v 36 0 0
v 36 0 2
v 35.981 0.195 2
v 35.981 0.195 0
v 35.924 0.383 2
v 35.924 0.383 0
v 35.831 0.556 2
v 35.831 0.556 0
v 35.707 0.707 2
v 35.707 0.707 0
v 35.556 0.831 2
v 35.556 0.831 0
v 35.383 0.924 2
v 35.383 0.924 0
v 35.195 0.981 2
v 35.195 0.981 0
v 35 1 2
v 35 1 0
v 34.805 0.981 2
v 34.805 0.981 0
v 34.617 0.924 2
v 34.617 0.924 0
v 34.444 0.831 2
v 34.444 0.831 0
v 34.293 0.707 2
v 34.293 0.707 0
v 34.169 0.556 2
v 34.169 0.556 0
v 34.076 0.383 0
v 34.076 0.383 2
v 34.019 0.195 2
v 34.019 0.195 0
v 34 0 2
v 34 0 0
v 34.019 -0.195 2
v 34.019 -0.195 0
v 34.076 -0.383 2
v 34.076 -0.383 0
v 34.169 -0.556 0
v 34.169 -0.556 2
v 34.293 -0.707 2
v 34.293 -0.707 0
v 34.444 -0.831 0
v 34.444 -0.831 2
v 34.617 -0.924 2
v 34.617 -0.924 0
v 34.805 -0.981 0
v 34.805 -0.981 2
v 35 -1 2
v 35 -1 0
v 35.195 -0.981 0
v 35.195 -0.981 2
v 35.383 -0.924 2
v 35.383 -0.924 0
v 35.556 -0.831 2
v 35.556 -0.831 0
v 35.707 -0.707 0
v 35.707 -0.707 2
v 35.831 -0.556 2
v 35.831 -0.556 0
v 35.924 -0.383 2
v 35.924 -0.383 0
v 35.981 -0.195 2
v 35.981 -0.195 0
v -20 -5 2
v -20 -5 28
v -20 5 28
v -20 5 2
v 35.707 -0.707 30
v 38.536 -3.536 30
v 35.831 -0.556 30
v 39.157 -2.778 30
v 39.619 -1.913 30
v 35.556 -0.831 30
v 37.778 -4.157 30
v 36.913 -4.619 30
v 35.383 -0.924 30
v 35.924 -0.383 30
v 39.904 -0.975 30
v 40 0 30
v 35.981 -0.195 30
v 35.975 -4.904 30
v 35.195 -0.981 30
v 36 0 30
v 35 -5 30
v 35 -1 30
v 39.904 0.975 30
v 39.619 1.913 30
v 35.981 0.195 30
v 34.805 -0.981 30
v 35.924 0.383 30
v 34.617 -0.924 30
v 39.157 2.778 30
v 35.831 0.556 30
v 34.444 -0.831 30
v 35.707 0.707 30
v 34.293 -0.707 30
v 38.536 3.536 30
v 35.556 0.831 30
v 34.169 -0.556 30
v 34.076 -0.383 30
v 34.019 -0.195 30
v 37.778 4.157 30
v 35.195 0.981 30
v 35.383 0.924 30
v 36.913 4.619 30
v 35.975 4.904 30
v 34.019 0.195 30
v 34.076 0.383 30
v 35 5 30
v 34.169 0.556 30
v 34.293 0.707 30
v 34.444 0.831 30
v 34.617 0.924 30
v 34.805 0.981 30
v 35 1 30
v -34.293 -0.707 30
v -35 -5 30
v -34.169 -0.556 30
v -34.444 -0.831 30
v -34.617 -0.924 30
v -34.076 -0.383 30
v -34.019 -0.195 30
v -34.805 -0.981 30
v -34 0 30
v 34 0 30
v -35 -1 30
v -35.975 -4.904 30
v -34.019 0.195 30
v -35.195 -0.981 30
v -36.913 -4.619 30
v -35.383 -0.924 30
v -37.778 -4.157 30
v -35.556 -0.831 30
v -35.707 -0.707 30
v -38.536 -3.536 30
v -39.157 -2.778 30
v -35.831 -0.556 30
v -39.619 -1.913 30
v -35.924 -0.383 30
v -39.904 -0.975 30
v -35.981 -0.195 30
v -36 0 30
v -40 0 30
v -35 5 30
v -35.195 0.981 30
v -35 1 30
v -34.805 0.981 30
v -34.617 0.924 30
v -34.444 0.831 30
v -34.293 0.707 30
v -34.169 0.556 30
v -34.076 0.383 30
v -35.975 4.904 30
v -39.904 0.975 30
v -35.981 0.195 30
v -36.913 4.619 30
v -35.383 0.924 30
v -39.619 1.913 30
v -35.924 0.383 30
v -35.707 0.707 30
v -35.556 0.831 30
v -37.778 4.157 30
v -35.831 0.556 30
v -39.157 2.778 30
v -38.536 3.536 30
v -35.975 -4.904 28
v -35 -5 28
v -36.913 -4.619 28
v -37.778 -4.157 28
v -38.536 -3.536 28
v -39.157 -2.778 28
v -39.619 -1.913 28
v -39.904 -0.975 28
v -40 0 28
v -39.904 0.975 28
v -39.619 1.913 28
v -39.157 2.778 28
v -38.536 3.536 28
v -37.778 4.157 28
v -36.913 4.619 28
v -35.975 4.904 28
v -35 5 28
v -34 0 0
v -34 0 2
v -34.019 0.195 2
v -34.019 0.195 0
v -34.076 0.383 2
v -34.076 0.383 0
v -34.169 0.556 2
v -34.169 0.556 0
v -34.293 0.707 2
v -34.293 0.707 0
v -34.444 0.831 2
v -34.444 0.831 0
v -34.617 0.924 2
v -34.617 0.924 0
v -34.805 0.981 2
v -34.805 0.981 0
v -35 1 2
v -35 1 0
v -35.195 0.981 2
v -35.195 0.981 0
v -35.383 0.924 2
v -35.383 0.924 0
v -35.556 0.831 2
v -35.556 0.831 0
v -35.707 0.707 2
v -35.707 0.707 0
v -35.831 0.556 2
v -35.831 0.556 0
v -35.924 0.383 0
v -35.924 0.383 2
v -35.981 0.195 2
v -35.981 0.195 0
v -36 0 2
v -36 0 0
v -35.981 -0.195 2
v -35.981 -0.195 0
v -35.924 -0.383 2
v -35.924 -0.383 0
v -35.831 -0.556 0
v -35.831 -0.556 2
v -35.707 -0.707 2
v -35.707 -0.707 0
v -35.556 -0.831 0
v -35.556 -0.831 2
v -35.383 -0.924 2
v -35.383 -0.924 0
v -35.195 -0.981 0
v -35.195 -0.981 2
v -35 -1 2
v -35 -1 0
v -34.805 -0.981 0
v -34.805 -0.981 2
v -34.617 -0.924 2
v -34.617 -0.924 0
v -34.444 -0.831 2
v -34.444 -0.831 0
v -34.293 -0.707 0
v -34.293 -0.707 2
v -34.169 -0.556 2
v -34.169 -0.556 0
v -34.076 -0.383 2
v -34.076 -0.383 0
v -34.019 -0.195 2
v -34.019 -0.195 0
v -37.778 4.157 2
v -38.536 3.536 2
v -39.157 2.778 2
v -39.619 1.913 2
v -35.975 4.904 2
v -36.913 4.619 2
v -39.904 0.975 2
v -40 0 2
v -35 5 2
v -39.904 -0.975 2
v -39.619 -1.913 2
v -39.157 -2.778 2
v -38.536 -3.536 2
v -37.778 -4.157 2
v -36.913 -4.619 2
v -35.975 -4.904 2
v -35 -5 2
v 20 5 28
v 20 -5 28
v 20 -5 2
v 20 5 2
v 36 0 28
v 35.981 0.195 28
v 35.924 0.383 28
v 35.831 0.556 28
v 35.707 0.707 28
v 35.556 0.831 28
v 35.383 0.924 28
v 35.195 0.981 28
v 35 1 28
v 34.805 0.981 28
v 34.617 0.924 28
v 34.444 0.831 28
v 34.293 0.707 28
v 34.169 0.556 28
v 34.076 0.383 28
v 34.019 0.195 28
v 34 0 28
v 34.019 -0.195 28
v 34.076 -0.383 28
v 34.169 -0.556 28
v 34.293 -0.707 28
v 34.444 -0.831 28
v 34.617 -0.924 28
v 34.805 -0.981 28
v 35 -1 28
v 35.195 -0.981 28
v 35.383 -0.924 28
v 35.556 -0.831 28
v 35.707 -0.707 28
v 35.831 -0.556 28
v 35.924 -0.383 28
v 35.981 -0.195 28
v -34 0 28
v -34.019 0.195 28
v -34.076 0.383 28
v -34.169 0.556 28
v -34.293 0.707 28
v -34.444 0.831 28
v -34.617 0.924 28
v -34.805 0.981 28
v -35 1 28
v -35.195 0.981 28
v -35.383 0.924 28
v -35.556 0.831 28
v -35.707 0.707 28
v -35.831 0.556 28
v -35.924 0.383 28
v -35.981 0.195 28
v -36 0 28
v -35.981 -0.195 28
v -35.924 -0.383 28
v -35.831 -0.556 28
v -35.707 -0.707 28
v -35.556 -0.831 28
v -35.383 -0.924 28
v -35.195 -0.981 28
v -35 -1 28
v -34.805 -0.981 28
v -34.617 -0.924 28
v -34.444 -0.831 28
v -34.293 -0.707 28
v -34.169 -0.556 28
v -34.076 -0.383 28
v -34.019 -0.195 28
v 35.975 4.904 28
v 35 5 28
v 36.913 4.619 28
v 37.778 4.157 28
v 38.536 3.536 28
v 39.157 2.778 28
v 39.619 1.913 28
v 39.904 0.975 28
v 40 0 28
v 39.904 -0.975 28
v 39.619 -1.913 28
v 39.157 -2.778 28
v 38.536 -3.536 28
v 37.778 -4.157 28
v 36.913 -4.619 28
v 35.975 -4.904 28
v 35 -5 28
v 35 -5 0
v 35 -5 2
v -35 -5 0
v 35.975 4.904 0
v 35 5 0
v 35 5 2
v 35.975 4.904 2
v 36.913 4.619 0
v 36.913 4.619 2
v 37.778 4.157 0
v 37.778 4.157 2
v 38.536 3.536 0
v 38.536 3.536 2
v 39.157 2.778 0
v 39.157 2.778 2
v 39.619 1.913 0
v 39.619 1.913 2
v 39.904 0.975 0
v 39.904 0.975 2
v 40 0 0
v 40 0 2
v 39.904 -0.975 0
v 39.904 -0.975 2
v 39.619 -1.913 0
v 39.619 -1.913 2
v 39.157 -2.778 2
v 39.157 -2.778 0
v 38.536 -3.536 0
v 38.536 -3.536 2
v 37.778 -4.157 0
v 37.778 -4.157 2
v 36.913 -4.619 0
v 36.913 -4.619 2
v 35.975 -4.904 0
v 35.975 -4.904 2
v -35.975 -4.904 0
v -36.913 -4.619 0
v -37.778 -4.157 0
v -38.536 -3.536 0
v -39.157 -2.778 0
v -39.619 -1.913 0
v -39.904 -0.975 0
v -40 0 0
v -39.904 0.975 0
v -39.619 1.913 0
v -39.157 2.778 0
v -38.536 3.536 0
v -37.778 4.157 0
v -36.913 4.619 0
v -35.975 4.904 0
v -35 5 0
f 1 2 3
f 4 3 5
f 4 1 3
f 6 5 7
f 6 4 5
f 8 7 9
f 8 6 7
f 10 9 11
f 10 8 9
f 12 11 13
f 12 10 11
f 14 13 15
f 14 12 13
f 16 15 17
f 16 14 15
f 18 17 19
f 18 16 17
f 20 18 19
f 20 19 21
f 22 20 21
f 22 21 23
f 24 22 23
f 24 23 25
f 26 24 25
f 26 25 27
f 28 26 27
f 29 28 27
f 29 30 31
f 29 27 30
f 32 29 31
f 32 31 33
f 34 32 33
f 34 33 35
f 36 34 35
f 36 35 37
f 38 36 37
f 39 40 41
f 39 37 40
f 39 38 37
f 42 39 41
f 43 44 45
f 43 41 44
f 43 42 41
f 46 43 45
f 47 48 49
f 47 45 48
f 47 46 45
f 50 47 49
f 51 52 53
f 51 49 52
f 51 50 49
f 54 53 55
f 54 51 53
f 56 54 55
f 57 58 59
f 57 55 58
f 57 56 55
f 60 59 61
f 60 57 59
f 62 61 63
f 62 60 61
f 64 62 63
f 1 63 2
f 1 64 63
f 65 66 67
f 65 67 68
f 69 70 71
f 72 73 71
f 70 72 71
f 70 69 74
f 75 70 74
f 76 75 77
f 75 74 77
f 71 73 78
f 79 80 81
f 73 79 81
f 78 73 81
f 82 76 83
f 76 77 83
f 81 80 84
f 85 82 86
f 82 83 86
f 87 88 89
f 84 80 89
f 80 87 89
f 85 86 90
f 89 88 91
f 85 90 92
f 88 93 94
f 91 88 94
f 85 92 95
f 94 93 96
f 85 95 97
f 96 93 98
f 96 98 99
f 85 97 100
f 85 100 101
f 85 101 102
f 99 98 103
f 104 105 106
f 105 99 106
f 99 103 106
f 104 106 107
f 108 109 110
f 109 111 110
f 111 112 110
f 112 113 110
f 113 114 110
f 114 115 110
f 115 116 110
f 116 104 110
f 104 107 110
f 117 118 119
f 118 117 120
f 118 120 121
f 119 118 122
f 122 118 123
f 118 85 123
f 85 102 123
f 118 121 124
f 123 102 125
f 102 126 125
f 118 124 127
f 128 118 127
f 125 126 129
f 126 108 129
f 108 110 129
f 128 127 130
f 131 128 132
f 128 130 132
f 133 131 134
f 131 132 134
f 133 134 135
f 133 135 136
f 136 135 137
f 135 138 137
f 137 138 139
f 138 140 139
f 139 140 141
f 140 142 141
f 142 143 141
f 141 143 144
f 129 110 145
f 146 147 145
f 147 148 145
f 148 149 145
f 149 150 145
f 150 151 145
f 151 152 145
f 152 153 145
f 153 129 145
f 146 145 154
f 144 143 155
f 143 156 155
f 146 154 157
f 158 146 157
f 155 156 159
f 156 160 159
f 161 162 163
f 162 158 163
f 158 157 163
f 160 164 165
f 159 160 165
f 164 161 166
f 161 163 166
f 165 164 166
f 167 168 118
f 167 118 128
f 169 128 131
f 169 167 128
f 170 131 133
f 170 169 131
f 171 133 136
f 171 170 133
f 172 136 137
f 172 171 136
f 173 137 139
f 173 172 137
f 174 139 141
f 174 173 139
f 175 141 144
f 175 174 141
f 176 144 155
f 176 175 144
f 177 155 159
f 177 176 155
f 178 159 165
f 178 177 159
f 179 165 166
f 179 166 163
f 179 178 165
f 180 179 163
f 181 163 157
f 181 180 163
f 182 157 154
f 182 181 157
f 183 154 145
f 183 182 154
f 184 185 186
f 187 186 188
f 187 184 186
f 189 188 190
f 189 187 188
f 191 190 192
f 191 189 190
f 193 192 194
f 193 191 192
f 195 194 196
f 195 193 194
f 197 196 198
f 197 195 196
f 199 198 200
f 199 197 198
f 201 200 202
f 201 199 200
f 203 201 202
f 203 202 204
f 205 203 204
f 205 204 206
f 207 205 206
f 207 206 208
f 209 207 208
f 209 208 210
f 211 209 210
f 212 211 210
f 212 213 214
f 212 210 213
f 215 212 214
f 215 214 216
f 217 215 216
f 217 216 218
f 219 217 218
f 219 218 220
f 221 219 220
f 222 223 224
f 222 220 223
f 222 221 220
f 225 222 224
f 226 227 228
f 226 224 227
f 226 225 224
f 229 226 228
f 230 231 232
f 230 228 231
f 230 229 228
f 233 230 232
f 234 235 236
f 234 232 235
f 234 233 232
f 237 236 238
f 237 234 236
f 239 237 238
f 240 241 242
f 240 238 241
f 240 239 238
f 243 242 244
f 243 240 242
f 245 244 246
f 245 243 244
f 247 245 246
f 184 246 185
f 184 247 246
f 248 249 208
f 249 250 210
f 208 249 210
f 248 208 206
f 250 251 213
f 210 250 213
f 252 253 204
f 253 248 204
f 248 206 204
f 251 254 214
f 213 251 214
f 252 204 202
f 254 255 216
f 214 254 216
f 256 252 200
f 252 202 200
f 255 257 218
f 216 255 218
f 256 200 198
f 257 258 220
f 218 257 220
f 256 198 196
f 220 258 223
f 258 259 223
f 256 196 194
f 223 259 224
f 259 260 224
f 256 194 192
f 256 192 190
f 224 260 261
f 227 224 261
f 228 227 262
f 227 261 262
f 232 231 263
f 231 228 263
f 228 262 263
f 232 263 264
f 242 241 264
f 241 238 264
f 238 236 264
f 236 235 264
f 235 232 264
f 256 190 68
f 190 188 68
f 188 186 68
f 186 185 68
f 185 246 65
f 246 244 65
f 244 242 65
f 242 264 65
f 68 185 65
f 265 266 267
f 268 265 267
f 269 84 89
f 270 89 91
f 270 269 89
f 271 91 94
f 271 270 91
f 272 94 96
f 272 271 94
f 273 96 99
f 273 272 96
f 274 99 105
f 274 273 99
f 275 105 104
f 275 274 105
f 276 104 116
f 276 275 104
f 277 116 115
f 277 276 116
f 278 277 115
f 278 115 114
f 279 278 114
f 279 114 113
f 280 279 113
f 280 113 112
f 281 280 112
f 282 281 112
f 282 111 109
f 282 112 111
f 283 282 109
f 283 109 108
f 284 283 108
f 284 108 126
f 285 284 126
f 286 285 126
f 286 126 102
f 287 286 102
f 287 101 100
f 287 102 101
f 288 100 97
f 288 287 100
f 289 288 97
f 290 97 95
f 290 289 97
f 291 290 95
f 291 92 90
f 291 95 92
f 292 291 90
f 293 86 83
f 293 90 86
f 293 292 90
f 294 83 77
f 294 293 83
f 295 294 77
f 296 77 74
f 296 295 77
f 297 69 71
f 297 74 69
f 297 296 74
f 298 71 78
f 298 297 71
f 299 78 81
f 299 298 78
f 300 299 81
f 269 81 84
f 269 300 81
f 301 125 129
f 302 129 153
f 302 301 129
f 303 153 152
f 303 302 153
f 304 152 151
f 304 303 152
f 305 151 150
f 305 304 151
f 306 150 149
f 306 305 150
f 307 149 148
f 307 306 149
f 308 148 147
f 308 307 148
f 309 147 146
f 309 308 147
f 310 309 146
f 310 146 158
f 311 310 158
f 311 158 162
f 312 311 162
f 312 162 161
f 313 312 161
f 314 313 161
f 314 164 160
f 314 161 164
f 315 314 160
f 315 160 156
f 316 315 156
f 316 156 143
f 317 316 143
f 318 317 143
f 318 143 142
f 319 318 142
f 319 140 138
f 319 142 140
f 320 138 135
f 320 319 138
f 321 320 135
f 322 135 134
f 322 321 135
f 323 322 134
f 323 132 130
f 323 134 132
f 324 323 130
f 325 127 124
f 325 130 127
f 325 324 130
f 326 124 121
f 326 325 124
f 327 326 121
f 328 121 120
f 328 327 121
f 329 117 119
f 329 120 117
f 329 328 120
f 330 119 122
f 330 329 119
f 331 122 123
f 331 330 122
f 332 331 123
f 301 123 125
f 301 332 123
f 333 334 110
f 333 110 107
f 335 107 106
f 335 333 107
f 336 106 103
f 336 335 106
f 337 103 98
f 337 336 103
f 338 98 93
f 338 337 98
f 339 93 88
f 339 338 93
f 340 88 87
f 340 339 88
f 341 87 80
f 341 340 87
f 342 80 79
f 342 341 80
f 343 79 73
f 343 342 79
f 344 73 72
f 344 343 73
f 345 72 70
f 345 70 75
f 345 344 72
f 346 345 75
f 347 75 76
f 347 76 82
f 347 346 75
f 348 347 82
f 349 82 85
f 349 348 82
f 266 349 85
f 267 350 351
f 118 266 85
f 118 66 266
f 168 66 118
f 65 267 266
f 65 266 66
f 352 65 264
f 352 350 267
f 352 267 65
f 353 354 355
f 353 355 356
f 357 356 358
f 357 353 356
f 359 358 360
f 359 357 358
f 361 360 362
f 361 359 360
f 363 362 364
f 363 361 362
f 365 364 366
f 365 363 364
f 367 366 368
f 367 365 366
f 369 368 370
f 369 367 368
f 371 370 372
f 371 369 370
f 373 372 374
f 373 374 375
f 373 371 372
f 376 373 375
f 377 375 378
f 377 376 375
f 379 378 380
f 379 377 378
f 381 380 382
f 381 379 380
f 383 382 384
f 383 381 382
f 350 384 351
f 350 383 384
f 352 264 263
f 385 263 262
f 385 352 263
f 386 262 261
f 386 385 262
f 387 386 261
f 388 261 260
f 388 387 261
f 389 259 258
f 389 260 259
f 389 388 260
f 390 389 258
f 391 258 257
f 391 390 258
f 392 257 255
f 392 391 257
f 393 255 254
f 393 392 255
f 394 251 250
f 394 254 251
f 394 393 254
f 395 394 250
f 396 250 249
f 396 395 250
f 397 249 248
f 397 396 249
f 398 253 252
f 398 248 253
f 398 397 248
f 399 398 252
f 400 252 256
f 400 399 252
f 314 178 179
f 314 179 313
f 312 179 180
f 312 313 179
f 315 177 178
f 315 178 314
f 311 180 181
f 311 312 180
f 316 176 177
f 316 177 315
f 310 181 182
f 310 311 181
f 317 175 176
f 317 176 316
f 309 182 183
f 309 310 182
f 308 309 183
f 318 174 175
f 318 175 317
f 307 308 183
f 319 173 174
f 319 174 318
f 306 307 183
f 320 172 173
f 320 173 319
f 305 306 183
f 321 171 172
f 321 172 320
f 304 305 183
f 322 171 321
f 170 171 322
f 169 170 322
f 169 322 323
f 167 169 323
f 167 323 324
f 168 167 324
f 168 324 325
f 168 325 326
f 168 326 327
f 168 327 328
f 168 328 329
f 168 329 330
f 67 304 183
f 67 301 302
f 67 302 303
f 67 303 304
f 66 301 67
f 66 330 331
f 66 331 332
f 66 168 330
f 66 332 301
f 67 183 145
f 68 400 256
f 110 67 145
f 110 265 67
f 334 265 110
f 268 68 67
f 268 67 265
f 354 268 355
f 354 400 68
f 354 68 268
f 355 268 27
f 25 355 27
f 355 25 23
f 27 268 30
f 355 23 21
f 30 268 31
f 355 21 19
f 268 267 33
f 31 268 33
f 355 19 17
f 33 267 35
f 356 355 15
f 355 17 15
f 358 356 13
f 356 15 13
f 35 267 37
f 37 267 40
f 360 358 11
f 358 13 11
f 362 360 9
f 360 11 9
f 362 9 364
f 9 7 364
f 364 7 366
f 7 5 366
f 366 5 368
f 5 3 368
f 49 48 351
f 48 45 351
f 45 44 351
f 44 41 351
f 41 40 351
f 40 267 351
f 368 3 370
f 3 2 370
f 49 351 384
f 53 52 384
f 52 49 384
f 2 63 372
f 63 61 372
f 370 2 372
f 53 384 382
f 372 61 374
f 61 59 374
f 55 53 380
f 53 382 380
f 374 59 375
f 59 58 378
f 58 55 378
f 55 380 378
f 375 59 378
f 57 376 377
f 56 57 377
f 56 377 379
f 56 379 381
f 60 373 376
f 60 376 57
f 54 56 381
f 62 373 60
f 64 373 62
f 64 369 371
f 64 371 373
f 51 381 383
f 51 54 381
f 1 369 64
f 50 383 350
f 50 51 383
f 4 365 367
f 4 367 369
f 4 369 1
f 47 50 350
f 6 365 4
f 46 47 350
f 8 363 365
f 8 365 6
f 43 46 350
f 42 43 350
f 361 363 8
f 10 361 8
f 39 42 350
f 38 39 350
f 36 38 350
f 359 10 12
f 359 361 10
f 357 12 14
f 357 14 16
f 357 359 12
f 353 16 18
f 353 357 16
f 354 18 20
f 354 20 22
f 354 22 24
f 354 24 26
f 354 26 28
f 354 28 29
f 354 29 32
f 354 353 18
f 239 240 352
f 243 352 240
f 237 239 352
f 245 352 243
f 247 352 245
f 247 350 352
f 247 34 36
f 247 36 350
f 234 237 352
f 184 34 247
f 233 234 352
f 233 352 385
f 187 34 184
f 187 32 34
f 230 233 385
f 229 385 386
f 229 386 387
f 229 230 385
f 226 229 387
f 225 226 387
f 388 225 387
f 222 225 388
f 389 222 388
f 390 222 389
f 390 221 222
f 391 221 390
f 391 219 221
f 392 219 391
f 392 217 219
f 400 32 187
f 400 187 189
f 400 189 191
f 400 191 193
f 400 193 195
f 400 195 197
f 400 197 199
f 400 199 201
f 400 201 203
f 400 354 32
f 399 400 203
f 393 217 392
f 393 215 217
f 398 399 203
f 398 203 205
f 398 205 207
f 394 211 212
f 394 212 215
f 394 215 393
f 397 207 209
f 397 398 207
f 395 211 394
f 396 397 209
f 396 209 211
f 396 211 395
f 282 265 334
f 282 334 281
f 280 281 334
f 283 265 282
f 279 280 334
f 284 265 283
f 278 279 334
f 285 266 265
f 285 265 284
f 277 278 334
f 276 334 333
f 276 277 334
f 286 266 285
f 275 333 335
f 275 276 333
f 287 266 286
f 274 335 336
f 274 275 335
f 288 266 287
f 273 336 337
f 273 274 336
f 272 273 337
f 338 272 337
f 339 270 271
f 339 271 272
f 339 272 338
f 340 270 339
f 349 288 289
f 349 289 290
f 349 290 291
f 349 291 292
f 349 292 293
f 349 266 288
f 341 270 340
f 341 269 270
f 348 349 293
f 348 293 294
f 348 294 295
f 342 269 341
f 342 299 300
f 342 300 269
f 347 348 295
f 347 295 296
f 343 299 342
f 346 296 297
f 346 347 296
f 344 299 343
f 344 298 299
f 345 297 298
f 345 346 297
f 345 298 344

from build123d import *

# Parameters (mm, degrees)
EXTRUDE_1_DEPTH          = 30
SKETCH_2_R               = 1
CUT_EXTRUDE_4_DEPTH      = 31
CUT_EXTRUDE_4_DEPTH_BACK = 30
SKETCH_3_W               = 20
SKETCH_3_H               = 26
CUT_EXTRUDE_5_DEPTH      = 30
CUT_EXTRUDE_5_DEPTH_BACK = 30


with BuildPart() as part:
    # 草圖1 → 填料-伸長1 (new body)
    with BuildSketch(Plane.XY):
        with BuildLine():
            Line((-35, 5), (35, 5))
            ThreePointArc((35, 5), (40, 0), (35, -5))
            Line((35, -5), (-35, -5))
            ThreePointArc((-35, -5), (-40, 0), (-35, 5))
        make_face()
    extrude(amount=EXTRUDE_1_DEPTH)

    # 草圖2 → 除料-伸長4 (cut, two sides)
    with BuildSketch(Plane.XY) as cut_extrude_4_sk:
        with Locations((-35, 0)):
            Circle(SKETCH_2_R)
        with Locations((35, 0)):
            Circle(SKETCH_2_R)
    extrude(amount=CUT_EXTRUDE_4_DEPTH, mode=Mode.SUBTRACT)
    extrude(cut_extrude_4_sk.sketch, amount=-CUT_EXTRUDE_4_DEPTH_BACK, mode=Mode.SUBTRACT)

    # 草圖3 → 除料-伸長5 (cut, two sides)
    with BuildSketch(Plane(origin=(0, 0, 0), x_dir=(1, 0, 0), z_dir=(0, 1, 0))) as cut_extrude_5_sk:
        with Locations((-30, -15)):
            Rectangle(SKETCH_3_W, SKETCH_3_H)
        with Locations((30, -15)):
            Rectangle(SKETCH_3_W, SKETCH_3_H)
    extrude(amount=CUT_EXTRUDE_5_DEPTH, mode=Mode.SUBTRACT)
    extrude(cut_extrude_5_sk.sketch, amount=-CUT_EXTRUDE_5_DEPTH_BACK, mode=Mode.SUBTRACT)


solid = part.part
